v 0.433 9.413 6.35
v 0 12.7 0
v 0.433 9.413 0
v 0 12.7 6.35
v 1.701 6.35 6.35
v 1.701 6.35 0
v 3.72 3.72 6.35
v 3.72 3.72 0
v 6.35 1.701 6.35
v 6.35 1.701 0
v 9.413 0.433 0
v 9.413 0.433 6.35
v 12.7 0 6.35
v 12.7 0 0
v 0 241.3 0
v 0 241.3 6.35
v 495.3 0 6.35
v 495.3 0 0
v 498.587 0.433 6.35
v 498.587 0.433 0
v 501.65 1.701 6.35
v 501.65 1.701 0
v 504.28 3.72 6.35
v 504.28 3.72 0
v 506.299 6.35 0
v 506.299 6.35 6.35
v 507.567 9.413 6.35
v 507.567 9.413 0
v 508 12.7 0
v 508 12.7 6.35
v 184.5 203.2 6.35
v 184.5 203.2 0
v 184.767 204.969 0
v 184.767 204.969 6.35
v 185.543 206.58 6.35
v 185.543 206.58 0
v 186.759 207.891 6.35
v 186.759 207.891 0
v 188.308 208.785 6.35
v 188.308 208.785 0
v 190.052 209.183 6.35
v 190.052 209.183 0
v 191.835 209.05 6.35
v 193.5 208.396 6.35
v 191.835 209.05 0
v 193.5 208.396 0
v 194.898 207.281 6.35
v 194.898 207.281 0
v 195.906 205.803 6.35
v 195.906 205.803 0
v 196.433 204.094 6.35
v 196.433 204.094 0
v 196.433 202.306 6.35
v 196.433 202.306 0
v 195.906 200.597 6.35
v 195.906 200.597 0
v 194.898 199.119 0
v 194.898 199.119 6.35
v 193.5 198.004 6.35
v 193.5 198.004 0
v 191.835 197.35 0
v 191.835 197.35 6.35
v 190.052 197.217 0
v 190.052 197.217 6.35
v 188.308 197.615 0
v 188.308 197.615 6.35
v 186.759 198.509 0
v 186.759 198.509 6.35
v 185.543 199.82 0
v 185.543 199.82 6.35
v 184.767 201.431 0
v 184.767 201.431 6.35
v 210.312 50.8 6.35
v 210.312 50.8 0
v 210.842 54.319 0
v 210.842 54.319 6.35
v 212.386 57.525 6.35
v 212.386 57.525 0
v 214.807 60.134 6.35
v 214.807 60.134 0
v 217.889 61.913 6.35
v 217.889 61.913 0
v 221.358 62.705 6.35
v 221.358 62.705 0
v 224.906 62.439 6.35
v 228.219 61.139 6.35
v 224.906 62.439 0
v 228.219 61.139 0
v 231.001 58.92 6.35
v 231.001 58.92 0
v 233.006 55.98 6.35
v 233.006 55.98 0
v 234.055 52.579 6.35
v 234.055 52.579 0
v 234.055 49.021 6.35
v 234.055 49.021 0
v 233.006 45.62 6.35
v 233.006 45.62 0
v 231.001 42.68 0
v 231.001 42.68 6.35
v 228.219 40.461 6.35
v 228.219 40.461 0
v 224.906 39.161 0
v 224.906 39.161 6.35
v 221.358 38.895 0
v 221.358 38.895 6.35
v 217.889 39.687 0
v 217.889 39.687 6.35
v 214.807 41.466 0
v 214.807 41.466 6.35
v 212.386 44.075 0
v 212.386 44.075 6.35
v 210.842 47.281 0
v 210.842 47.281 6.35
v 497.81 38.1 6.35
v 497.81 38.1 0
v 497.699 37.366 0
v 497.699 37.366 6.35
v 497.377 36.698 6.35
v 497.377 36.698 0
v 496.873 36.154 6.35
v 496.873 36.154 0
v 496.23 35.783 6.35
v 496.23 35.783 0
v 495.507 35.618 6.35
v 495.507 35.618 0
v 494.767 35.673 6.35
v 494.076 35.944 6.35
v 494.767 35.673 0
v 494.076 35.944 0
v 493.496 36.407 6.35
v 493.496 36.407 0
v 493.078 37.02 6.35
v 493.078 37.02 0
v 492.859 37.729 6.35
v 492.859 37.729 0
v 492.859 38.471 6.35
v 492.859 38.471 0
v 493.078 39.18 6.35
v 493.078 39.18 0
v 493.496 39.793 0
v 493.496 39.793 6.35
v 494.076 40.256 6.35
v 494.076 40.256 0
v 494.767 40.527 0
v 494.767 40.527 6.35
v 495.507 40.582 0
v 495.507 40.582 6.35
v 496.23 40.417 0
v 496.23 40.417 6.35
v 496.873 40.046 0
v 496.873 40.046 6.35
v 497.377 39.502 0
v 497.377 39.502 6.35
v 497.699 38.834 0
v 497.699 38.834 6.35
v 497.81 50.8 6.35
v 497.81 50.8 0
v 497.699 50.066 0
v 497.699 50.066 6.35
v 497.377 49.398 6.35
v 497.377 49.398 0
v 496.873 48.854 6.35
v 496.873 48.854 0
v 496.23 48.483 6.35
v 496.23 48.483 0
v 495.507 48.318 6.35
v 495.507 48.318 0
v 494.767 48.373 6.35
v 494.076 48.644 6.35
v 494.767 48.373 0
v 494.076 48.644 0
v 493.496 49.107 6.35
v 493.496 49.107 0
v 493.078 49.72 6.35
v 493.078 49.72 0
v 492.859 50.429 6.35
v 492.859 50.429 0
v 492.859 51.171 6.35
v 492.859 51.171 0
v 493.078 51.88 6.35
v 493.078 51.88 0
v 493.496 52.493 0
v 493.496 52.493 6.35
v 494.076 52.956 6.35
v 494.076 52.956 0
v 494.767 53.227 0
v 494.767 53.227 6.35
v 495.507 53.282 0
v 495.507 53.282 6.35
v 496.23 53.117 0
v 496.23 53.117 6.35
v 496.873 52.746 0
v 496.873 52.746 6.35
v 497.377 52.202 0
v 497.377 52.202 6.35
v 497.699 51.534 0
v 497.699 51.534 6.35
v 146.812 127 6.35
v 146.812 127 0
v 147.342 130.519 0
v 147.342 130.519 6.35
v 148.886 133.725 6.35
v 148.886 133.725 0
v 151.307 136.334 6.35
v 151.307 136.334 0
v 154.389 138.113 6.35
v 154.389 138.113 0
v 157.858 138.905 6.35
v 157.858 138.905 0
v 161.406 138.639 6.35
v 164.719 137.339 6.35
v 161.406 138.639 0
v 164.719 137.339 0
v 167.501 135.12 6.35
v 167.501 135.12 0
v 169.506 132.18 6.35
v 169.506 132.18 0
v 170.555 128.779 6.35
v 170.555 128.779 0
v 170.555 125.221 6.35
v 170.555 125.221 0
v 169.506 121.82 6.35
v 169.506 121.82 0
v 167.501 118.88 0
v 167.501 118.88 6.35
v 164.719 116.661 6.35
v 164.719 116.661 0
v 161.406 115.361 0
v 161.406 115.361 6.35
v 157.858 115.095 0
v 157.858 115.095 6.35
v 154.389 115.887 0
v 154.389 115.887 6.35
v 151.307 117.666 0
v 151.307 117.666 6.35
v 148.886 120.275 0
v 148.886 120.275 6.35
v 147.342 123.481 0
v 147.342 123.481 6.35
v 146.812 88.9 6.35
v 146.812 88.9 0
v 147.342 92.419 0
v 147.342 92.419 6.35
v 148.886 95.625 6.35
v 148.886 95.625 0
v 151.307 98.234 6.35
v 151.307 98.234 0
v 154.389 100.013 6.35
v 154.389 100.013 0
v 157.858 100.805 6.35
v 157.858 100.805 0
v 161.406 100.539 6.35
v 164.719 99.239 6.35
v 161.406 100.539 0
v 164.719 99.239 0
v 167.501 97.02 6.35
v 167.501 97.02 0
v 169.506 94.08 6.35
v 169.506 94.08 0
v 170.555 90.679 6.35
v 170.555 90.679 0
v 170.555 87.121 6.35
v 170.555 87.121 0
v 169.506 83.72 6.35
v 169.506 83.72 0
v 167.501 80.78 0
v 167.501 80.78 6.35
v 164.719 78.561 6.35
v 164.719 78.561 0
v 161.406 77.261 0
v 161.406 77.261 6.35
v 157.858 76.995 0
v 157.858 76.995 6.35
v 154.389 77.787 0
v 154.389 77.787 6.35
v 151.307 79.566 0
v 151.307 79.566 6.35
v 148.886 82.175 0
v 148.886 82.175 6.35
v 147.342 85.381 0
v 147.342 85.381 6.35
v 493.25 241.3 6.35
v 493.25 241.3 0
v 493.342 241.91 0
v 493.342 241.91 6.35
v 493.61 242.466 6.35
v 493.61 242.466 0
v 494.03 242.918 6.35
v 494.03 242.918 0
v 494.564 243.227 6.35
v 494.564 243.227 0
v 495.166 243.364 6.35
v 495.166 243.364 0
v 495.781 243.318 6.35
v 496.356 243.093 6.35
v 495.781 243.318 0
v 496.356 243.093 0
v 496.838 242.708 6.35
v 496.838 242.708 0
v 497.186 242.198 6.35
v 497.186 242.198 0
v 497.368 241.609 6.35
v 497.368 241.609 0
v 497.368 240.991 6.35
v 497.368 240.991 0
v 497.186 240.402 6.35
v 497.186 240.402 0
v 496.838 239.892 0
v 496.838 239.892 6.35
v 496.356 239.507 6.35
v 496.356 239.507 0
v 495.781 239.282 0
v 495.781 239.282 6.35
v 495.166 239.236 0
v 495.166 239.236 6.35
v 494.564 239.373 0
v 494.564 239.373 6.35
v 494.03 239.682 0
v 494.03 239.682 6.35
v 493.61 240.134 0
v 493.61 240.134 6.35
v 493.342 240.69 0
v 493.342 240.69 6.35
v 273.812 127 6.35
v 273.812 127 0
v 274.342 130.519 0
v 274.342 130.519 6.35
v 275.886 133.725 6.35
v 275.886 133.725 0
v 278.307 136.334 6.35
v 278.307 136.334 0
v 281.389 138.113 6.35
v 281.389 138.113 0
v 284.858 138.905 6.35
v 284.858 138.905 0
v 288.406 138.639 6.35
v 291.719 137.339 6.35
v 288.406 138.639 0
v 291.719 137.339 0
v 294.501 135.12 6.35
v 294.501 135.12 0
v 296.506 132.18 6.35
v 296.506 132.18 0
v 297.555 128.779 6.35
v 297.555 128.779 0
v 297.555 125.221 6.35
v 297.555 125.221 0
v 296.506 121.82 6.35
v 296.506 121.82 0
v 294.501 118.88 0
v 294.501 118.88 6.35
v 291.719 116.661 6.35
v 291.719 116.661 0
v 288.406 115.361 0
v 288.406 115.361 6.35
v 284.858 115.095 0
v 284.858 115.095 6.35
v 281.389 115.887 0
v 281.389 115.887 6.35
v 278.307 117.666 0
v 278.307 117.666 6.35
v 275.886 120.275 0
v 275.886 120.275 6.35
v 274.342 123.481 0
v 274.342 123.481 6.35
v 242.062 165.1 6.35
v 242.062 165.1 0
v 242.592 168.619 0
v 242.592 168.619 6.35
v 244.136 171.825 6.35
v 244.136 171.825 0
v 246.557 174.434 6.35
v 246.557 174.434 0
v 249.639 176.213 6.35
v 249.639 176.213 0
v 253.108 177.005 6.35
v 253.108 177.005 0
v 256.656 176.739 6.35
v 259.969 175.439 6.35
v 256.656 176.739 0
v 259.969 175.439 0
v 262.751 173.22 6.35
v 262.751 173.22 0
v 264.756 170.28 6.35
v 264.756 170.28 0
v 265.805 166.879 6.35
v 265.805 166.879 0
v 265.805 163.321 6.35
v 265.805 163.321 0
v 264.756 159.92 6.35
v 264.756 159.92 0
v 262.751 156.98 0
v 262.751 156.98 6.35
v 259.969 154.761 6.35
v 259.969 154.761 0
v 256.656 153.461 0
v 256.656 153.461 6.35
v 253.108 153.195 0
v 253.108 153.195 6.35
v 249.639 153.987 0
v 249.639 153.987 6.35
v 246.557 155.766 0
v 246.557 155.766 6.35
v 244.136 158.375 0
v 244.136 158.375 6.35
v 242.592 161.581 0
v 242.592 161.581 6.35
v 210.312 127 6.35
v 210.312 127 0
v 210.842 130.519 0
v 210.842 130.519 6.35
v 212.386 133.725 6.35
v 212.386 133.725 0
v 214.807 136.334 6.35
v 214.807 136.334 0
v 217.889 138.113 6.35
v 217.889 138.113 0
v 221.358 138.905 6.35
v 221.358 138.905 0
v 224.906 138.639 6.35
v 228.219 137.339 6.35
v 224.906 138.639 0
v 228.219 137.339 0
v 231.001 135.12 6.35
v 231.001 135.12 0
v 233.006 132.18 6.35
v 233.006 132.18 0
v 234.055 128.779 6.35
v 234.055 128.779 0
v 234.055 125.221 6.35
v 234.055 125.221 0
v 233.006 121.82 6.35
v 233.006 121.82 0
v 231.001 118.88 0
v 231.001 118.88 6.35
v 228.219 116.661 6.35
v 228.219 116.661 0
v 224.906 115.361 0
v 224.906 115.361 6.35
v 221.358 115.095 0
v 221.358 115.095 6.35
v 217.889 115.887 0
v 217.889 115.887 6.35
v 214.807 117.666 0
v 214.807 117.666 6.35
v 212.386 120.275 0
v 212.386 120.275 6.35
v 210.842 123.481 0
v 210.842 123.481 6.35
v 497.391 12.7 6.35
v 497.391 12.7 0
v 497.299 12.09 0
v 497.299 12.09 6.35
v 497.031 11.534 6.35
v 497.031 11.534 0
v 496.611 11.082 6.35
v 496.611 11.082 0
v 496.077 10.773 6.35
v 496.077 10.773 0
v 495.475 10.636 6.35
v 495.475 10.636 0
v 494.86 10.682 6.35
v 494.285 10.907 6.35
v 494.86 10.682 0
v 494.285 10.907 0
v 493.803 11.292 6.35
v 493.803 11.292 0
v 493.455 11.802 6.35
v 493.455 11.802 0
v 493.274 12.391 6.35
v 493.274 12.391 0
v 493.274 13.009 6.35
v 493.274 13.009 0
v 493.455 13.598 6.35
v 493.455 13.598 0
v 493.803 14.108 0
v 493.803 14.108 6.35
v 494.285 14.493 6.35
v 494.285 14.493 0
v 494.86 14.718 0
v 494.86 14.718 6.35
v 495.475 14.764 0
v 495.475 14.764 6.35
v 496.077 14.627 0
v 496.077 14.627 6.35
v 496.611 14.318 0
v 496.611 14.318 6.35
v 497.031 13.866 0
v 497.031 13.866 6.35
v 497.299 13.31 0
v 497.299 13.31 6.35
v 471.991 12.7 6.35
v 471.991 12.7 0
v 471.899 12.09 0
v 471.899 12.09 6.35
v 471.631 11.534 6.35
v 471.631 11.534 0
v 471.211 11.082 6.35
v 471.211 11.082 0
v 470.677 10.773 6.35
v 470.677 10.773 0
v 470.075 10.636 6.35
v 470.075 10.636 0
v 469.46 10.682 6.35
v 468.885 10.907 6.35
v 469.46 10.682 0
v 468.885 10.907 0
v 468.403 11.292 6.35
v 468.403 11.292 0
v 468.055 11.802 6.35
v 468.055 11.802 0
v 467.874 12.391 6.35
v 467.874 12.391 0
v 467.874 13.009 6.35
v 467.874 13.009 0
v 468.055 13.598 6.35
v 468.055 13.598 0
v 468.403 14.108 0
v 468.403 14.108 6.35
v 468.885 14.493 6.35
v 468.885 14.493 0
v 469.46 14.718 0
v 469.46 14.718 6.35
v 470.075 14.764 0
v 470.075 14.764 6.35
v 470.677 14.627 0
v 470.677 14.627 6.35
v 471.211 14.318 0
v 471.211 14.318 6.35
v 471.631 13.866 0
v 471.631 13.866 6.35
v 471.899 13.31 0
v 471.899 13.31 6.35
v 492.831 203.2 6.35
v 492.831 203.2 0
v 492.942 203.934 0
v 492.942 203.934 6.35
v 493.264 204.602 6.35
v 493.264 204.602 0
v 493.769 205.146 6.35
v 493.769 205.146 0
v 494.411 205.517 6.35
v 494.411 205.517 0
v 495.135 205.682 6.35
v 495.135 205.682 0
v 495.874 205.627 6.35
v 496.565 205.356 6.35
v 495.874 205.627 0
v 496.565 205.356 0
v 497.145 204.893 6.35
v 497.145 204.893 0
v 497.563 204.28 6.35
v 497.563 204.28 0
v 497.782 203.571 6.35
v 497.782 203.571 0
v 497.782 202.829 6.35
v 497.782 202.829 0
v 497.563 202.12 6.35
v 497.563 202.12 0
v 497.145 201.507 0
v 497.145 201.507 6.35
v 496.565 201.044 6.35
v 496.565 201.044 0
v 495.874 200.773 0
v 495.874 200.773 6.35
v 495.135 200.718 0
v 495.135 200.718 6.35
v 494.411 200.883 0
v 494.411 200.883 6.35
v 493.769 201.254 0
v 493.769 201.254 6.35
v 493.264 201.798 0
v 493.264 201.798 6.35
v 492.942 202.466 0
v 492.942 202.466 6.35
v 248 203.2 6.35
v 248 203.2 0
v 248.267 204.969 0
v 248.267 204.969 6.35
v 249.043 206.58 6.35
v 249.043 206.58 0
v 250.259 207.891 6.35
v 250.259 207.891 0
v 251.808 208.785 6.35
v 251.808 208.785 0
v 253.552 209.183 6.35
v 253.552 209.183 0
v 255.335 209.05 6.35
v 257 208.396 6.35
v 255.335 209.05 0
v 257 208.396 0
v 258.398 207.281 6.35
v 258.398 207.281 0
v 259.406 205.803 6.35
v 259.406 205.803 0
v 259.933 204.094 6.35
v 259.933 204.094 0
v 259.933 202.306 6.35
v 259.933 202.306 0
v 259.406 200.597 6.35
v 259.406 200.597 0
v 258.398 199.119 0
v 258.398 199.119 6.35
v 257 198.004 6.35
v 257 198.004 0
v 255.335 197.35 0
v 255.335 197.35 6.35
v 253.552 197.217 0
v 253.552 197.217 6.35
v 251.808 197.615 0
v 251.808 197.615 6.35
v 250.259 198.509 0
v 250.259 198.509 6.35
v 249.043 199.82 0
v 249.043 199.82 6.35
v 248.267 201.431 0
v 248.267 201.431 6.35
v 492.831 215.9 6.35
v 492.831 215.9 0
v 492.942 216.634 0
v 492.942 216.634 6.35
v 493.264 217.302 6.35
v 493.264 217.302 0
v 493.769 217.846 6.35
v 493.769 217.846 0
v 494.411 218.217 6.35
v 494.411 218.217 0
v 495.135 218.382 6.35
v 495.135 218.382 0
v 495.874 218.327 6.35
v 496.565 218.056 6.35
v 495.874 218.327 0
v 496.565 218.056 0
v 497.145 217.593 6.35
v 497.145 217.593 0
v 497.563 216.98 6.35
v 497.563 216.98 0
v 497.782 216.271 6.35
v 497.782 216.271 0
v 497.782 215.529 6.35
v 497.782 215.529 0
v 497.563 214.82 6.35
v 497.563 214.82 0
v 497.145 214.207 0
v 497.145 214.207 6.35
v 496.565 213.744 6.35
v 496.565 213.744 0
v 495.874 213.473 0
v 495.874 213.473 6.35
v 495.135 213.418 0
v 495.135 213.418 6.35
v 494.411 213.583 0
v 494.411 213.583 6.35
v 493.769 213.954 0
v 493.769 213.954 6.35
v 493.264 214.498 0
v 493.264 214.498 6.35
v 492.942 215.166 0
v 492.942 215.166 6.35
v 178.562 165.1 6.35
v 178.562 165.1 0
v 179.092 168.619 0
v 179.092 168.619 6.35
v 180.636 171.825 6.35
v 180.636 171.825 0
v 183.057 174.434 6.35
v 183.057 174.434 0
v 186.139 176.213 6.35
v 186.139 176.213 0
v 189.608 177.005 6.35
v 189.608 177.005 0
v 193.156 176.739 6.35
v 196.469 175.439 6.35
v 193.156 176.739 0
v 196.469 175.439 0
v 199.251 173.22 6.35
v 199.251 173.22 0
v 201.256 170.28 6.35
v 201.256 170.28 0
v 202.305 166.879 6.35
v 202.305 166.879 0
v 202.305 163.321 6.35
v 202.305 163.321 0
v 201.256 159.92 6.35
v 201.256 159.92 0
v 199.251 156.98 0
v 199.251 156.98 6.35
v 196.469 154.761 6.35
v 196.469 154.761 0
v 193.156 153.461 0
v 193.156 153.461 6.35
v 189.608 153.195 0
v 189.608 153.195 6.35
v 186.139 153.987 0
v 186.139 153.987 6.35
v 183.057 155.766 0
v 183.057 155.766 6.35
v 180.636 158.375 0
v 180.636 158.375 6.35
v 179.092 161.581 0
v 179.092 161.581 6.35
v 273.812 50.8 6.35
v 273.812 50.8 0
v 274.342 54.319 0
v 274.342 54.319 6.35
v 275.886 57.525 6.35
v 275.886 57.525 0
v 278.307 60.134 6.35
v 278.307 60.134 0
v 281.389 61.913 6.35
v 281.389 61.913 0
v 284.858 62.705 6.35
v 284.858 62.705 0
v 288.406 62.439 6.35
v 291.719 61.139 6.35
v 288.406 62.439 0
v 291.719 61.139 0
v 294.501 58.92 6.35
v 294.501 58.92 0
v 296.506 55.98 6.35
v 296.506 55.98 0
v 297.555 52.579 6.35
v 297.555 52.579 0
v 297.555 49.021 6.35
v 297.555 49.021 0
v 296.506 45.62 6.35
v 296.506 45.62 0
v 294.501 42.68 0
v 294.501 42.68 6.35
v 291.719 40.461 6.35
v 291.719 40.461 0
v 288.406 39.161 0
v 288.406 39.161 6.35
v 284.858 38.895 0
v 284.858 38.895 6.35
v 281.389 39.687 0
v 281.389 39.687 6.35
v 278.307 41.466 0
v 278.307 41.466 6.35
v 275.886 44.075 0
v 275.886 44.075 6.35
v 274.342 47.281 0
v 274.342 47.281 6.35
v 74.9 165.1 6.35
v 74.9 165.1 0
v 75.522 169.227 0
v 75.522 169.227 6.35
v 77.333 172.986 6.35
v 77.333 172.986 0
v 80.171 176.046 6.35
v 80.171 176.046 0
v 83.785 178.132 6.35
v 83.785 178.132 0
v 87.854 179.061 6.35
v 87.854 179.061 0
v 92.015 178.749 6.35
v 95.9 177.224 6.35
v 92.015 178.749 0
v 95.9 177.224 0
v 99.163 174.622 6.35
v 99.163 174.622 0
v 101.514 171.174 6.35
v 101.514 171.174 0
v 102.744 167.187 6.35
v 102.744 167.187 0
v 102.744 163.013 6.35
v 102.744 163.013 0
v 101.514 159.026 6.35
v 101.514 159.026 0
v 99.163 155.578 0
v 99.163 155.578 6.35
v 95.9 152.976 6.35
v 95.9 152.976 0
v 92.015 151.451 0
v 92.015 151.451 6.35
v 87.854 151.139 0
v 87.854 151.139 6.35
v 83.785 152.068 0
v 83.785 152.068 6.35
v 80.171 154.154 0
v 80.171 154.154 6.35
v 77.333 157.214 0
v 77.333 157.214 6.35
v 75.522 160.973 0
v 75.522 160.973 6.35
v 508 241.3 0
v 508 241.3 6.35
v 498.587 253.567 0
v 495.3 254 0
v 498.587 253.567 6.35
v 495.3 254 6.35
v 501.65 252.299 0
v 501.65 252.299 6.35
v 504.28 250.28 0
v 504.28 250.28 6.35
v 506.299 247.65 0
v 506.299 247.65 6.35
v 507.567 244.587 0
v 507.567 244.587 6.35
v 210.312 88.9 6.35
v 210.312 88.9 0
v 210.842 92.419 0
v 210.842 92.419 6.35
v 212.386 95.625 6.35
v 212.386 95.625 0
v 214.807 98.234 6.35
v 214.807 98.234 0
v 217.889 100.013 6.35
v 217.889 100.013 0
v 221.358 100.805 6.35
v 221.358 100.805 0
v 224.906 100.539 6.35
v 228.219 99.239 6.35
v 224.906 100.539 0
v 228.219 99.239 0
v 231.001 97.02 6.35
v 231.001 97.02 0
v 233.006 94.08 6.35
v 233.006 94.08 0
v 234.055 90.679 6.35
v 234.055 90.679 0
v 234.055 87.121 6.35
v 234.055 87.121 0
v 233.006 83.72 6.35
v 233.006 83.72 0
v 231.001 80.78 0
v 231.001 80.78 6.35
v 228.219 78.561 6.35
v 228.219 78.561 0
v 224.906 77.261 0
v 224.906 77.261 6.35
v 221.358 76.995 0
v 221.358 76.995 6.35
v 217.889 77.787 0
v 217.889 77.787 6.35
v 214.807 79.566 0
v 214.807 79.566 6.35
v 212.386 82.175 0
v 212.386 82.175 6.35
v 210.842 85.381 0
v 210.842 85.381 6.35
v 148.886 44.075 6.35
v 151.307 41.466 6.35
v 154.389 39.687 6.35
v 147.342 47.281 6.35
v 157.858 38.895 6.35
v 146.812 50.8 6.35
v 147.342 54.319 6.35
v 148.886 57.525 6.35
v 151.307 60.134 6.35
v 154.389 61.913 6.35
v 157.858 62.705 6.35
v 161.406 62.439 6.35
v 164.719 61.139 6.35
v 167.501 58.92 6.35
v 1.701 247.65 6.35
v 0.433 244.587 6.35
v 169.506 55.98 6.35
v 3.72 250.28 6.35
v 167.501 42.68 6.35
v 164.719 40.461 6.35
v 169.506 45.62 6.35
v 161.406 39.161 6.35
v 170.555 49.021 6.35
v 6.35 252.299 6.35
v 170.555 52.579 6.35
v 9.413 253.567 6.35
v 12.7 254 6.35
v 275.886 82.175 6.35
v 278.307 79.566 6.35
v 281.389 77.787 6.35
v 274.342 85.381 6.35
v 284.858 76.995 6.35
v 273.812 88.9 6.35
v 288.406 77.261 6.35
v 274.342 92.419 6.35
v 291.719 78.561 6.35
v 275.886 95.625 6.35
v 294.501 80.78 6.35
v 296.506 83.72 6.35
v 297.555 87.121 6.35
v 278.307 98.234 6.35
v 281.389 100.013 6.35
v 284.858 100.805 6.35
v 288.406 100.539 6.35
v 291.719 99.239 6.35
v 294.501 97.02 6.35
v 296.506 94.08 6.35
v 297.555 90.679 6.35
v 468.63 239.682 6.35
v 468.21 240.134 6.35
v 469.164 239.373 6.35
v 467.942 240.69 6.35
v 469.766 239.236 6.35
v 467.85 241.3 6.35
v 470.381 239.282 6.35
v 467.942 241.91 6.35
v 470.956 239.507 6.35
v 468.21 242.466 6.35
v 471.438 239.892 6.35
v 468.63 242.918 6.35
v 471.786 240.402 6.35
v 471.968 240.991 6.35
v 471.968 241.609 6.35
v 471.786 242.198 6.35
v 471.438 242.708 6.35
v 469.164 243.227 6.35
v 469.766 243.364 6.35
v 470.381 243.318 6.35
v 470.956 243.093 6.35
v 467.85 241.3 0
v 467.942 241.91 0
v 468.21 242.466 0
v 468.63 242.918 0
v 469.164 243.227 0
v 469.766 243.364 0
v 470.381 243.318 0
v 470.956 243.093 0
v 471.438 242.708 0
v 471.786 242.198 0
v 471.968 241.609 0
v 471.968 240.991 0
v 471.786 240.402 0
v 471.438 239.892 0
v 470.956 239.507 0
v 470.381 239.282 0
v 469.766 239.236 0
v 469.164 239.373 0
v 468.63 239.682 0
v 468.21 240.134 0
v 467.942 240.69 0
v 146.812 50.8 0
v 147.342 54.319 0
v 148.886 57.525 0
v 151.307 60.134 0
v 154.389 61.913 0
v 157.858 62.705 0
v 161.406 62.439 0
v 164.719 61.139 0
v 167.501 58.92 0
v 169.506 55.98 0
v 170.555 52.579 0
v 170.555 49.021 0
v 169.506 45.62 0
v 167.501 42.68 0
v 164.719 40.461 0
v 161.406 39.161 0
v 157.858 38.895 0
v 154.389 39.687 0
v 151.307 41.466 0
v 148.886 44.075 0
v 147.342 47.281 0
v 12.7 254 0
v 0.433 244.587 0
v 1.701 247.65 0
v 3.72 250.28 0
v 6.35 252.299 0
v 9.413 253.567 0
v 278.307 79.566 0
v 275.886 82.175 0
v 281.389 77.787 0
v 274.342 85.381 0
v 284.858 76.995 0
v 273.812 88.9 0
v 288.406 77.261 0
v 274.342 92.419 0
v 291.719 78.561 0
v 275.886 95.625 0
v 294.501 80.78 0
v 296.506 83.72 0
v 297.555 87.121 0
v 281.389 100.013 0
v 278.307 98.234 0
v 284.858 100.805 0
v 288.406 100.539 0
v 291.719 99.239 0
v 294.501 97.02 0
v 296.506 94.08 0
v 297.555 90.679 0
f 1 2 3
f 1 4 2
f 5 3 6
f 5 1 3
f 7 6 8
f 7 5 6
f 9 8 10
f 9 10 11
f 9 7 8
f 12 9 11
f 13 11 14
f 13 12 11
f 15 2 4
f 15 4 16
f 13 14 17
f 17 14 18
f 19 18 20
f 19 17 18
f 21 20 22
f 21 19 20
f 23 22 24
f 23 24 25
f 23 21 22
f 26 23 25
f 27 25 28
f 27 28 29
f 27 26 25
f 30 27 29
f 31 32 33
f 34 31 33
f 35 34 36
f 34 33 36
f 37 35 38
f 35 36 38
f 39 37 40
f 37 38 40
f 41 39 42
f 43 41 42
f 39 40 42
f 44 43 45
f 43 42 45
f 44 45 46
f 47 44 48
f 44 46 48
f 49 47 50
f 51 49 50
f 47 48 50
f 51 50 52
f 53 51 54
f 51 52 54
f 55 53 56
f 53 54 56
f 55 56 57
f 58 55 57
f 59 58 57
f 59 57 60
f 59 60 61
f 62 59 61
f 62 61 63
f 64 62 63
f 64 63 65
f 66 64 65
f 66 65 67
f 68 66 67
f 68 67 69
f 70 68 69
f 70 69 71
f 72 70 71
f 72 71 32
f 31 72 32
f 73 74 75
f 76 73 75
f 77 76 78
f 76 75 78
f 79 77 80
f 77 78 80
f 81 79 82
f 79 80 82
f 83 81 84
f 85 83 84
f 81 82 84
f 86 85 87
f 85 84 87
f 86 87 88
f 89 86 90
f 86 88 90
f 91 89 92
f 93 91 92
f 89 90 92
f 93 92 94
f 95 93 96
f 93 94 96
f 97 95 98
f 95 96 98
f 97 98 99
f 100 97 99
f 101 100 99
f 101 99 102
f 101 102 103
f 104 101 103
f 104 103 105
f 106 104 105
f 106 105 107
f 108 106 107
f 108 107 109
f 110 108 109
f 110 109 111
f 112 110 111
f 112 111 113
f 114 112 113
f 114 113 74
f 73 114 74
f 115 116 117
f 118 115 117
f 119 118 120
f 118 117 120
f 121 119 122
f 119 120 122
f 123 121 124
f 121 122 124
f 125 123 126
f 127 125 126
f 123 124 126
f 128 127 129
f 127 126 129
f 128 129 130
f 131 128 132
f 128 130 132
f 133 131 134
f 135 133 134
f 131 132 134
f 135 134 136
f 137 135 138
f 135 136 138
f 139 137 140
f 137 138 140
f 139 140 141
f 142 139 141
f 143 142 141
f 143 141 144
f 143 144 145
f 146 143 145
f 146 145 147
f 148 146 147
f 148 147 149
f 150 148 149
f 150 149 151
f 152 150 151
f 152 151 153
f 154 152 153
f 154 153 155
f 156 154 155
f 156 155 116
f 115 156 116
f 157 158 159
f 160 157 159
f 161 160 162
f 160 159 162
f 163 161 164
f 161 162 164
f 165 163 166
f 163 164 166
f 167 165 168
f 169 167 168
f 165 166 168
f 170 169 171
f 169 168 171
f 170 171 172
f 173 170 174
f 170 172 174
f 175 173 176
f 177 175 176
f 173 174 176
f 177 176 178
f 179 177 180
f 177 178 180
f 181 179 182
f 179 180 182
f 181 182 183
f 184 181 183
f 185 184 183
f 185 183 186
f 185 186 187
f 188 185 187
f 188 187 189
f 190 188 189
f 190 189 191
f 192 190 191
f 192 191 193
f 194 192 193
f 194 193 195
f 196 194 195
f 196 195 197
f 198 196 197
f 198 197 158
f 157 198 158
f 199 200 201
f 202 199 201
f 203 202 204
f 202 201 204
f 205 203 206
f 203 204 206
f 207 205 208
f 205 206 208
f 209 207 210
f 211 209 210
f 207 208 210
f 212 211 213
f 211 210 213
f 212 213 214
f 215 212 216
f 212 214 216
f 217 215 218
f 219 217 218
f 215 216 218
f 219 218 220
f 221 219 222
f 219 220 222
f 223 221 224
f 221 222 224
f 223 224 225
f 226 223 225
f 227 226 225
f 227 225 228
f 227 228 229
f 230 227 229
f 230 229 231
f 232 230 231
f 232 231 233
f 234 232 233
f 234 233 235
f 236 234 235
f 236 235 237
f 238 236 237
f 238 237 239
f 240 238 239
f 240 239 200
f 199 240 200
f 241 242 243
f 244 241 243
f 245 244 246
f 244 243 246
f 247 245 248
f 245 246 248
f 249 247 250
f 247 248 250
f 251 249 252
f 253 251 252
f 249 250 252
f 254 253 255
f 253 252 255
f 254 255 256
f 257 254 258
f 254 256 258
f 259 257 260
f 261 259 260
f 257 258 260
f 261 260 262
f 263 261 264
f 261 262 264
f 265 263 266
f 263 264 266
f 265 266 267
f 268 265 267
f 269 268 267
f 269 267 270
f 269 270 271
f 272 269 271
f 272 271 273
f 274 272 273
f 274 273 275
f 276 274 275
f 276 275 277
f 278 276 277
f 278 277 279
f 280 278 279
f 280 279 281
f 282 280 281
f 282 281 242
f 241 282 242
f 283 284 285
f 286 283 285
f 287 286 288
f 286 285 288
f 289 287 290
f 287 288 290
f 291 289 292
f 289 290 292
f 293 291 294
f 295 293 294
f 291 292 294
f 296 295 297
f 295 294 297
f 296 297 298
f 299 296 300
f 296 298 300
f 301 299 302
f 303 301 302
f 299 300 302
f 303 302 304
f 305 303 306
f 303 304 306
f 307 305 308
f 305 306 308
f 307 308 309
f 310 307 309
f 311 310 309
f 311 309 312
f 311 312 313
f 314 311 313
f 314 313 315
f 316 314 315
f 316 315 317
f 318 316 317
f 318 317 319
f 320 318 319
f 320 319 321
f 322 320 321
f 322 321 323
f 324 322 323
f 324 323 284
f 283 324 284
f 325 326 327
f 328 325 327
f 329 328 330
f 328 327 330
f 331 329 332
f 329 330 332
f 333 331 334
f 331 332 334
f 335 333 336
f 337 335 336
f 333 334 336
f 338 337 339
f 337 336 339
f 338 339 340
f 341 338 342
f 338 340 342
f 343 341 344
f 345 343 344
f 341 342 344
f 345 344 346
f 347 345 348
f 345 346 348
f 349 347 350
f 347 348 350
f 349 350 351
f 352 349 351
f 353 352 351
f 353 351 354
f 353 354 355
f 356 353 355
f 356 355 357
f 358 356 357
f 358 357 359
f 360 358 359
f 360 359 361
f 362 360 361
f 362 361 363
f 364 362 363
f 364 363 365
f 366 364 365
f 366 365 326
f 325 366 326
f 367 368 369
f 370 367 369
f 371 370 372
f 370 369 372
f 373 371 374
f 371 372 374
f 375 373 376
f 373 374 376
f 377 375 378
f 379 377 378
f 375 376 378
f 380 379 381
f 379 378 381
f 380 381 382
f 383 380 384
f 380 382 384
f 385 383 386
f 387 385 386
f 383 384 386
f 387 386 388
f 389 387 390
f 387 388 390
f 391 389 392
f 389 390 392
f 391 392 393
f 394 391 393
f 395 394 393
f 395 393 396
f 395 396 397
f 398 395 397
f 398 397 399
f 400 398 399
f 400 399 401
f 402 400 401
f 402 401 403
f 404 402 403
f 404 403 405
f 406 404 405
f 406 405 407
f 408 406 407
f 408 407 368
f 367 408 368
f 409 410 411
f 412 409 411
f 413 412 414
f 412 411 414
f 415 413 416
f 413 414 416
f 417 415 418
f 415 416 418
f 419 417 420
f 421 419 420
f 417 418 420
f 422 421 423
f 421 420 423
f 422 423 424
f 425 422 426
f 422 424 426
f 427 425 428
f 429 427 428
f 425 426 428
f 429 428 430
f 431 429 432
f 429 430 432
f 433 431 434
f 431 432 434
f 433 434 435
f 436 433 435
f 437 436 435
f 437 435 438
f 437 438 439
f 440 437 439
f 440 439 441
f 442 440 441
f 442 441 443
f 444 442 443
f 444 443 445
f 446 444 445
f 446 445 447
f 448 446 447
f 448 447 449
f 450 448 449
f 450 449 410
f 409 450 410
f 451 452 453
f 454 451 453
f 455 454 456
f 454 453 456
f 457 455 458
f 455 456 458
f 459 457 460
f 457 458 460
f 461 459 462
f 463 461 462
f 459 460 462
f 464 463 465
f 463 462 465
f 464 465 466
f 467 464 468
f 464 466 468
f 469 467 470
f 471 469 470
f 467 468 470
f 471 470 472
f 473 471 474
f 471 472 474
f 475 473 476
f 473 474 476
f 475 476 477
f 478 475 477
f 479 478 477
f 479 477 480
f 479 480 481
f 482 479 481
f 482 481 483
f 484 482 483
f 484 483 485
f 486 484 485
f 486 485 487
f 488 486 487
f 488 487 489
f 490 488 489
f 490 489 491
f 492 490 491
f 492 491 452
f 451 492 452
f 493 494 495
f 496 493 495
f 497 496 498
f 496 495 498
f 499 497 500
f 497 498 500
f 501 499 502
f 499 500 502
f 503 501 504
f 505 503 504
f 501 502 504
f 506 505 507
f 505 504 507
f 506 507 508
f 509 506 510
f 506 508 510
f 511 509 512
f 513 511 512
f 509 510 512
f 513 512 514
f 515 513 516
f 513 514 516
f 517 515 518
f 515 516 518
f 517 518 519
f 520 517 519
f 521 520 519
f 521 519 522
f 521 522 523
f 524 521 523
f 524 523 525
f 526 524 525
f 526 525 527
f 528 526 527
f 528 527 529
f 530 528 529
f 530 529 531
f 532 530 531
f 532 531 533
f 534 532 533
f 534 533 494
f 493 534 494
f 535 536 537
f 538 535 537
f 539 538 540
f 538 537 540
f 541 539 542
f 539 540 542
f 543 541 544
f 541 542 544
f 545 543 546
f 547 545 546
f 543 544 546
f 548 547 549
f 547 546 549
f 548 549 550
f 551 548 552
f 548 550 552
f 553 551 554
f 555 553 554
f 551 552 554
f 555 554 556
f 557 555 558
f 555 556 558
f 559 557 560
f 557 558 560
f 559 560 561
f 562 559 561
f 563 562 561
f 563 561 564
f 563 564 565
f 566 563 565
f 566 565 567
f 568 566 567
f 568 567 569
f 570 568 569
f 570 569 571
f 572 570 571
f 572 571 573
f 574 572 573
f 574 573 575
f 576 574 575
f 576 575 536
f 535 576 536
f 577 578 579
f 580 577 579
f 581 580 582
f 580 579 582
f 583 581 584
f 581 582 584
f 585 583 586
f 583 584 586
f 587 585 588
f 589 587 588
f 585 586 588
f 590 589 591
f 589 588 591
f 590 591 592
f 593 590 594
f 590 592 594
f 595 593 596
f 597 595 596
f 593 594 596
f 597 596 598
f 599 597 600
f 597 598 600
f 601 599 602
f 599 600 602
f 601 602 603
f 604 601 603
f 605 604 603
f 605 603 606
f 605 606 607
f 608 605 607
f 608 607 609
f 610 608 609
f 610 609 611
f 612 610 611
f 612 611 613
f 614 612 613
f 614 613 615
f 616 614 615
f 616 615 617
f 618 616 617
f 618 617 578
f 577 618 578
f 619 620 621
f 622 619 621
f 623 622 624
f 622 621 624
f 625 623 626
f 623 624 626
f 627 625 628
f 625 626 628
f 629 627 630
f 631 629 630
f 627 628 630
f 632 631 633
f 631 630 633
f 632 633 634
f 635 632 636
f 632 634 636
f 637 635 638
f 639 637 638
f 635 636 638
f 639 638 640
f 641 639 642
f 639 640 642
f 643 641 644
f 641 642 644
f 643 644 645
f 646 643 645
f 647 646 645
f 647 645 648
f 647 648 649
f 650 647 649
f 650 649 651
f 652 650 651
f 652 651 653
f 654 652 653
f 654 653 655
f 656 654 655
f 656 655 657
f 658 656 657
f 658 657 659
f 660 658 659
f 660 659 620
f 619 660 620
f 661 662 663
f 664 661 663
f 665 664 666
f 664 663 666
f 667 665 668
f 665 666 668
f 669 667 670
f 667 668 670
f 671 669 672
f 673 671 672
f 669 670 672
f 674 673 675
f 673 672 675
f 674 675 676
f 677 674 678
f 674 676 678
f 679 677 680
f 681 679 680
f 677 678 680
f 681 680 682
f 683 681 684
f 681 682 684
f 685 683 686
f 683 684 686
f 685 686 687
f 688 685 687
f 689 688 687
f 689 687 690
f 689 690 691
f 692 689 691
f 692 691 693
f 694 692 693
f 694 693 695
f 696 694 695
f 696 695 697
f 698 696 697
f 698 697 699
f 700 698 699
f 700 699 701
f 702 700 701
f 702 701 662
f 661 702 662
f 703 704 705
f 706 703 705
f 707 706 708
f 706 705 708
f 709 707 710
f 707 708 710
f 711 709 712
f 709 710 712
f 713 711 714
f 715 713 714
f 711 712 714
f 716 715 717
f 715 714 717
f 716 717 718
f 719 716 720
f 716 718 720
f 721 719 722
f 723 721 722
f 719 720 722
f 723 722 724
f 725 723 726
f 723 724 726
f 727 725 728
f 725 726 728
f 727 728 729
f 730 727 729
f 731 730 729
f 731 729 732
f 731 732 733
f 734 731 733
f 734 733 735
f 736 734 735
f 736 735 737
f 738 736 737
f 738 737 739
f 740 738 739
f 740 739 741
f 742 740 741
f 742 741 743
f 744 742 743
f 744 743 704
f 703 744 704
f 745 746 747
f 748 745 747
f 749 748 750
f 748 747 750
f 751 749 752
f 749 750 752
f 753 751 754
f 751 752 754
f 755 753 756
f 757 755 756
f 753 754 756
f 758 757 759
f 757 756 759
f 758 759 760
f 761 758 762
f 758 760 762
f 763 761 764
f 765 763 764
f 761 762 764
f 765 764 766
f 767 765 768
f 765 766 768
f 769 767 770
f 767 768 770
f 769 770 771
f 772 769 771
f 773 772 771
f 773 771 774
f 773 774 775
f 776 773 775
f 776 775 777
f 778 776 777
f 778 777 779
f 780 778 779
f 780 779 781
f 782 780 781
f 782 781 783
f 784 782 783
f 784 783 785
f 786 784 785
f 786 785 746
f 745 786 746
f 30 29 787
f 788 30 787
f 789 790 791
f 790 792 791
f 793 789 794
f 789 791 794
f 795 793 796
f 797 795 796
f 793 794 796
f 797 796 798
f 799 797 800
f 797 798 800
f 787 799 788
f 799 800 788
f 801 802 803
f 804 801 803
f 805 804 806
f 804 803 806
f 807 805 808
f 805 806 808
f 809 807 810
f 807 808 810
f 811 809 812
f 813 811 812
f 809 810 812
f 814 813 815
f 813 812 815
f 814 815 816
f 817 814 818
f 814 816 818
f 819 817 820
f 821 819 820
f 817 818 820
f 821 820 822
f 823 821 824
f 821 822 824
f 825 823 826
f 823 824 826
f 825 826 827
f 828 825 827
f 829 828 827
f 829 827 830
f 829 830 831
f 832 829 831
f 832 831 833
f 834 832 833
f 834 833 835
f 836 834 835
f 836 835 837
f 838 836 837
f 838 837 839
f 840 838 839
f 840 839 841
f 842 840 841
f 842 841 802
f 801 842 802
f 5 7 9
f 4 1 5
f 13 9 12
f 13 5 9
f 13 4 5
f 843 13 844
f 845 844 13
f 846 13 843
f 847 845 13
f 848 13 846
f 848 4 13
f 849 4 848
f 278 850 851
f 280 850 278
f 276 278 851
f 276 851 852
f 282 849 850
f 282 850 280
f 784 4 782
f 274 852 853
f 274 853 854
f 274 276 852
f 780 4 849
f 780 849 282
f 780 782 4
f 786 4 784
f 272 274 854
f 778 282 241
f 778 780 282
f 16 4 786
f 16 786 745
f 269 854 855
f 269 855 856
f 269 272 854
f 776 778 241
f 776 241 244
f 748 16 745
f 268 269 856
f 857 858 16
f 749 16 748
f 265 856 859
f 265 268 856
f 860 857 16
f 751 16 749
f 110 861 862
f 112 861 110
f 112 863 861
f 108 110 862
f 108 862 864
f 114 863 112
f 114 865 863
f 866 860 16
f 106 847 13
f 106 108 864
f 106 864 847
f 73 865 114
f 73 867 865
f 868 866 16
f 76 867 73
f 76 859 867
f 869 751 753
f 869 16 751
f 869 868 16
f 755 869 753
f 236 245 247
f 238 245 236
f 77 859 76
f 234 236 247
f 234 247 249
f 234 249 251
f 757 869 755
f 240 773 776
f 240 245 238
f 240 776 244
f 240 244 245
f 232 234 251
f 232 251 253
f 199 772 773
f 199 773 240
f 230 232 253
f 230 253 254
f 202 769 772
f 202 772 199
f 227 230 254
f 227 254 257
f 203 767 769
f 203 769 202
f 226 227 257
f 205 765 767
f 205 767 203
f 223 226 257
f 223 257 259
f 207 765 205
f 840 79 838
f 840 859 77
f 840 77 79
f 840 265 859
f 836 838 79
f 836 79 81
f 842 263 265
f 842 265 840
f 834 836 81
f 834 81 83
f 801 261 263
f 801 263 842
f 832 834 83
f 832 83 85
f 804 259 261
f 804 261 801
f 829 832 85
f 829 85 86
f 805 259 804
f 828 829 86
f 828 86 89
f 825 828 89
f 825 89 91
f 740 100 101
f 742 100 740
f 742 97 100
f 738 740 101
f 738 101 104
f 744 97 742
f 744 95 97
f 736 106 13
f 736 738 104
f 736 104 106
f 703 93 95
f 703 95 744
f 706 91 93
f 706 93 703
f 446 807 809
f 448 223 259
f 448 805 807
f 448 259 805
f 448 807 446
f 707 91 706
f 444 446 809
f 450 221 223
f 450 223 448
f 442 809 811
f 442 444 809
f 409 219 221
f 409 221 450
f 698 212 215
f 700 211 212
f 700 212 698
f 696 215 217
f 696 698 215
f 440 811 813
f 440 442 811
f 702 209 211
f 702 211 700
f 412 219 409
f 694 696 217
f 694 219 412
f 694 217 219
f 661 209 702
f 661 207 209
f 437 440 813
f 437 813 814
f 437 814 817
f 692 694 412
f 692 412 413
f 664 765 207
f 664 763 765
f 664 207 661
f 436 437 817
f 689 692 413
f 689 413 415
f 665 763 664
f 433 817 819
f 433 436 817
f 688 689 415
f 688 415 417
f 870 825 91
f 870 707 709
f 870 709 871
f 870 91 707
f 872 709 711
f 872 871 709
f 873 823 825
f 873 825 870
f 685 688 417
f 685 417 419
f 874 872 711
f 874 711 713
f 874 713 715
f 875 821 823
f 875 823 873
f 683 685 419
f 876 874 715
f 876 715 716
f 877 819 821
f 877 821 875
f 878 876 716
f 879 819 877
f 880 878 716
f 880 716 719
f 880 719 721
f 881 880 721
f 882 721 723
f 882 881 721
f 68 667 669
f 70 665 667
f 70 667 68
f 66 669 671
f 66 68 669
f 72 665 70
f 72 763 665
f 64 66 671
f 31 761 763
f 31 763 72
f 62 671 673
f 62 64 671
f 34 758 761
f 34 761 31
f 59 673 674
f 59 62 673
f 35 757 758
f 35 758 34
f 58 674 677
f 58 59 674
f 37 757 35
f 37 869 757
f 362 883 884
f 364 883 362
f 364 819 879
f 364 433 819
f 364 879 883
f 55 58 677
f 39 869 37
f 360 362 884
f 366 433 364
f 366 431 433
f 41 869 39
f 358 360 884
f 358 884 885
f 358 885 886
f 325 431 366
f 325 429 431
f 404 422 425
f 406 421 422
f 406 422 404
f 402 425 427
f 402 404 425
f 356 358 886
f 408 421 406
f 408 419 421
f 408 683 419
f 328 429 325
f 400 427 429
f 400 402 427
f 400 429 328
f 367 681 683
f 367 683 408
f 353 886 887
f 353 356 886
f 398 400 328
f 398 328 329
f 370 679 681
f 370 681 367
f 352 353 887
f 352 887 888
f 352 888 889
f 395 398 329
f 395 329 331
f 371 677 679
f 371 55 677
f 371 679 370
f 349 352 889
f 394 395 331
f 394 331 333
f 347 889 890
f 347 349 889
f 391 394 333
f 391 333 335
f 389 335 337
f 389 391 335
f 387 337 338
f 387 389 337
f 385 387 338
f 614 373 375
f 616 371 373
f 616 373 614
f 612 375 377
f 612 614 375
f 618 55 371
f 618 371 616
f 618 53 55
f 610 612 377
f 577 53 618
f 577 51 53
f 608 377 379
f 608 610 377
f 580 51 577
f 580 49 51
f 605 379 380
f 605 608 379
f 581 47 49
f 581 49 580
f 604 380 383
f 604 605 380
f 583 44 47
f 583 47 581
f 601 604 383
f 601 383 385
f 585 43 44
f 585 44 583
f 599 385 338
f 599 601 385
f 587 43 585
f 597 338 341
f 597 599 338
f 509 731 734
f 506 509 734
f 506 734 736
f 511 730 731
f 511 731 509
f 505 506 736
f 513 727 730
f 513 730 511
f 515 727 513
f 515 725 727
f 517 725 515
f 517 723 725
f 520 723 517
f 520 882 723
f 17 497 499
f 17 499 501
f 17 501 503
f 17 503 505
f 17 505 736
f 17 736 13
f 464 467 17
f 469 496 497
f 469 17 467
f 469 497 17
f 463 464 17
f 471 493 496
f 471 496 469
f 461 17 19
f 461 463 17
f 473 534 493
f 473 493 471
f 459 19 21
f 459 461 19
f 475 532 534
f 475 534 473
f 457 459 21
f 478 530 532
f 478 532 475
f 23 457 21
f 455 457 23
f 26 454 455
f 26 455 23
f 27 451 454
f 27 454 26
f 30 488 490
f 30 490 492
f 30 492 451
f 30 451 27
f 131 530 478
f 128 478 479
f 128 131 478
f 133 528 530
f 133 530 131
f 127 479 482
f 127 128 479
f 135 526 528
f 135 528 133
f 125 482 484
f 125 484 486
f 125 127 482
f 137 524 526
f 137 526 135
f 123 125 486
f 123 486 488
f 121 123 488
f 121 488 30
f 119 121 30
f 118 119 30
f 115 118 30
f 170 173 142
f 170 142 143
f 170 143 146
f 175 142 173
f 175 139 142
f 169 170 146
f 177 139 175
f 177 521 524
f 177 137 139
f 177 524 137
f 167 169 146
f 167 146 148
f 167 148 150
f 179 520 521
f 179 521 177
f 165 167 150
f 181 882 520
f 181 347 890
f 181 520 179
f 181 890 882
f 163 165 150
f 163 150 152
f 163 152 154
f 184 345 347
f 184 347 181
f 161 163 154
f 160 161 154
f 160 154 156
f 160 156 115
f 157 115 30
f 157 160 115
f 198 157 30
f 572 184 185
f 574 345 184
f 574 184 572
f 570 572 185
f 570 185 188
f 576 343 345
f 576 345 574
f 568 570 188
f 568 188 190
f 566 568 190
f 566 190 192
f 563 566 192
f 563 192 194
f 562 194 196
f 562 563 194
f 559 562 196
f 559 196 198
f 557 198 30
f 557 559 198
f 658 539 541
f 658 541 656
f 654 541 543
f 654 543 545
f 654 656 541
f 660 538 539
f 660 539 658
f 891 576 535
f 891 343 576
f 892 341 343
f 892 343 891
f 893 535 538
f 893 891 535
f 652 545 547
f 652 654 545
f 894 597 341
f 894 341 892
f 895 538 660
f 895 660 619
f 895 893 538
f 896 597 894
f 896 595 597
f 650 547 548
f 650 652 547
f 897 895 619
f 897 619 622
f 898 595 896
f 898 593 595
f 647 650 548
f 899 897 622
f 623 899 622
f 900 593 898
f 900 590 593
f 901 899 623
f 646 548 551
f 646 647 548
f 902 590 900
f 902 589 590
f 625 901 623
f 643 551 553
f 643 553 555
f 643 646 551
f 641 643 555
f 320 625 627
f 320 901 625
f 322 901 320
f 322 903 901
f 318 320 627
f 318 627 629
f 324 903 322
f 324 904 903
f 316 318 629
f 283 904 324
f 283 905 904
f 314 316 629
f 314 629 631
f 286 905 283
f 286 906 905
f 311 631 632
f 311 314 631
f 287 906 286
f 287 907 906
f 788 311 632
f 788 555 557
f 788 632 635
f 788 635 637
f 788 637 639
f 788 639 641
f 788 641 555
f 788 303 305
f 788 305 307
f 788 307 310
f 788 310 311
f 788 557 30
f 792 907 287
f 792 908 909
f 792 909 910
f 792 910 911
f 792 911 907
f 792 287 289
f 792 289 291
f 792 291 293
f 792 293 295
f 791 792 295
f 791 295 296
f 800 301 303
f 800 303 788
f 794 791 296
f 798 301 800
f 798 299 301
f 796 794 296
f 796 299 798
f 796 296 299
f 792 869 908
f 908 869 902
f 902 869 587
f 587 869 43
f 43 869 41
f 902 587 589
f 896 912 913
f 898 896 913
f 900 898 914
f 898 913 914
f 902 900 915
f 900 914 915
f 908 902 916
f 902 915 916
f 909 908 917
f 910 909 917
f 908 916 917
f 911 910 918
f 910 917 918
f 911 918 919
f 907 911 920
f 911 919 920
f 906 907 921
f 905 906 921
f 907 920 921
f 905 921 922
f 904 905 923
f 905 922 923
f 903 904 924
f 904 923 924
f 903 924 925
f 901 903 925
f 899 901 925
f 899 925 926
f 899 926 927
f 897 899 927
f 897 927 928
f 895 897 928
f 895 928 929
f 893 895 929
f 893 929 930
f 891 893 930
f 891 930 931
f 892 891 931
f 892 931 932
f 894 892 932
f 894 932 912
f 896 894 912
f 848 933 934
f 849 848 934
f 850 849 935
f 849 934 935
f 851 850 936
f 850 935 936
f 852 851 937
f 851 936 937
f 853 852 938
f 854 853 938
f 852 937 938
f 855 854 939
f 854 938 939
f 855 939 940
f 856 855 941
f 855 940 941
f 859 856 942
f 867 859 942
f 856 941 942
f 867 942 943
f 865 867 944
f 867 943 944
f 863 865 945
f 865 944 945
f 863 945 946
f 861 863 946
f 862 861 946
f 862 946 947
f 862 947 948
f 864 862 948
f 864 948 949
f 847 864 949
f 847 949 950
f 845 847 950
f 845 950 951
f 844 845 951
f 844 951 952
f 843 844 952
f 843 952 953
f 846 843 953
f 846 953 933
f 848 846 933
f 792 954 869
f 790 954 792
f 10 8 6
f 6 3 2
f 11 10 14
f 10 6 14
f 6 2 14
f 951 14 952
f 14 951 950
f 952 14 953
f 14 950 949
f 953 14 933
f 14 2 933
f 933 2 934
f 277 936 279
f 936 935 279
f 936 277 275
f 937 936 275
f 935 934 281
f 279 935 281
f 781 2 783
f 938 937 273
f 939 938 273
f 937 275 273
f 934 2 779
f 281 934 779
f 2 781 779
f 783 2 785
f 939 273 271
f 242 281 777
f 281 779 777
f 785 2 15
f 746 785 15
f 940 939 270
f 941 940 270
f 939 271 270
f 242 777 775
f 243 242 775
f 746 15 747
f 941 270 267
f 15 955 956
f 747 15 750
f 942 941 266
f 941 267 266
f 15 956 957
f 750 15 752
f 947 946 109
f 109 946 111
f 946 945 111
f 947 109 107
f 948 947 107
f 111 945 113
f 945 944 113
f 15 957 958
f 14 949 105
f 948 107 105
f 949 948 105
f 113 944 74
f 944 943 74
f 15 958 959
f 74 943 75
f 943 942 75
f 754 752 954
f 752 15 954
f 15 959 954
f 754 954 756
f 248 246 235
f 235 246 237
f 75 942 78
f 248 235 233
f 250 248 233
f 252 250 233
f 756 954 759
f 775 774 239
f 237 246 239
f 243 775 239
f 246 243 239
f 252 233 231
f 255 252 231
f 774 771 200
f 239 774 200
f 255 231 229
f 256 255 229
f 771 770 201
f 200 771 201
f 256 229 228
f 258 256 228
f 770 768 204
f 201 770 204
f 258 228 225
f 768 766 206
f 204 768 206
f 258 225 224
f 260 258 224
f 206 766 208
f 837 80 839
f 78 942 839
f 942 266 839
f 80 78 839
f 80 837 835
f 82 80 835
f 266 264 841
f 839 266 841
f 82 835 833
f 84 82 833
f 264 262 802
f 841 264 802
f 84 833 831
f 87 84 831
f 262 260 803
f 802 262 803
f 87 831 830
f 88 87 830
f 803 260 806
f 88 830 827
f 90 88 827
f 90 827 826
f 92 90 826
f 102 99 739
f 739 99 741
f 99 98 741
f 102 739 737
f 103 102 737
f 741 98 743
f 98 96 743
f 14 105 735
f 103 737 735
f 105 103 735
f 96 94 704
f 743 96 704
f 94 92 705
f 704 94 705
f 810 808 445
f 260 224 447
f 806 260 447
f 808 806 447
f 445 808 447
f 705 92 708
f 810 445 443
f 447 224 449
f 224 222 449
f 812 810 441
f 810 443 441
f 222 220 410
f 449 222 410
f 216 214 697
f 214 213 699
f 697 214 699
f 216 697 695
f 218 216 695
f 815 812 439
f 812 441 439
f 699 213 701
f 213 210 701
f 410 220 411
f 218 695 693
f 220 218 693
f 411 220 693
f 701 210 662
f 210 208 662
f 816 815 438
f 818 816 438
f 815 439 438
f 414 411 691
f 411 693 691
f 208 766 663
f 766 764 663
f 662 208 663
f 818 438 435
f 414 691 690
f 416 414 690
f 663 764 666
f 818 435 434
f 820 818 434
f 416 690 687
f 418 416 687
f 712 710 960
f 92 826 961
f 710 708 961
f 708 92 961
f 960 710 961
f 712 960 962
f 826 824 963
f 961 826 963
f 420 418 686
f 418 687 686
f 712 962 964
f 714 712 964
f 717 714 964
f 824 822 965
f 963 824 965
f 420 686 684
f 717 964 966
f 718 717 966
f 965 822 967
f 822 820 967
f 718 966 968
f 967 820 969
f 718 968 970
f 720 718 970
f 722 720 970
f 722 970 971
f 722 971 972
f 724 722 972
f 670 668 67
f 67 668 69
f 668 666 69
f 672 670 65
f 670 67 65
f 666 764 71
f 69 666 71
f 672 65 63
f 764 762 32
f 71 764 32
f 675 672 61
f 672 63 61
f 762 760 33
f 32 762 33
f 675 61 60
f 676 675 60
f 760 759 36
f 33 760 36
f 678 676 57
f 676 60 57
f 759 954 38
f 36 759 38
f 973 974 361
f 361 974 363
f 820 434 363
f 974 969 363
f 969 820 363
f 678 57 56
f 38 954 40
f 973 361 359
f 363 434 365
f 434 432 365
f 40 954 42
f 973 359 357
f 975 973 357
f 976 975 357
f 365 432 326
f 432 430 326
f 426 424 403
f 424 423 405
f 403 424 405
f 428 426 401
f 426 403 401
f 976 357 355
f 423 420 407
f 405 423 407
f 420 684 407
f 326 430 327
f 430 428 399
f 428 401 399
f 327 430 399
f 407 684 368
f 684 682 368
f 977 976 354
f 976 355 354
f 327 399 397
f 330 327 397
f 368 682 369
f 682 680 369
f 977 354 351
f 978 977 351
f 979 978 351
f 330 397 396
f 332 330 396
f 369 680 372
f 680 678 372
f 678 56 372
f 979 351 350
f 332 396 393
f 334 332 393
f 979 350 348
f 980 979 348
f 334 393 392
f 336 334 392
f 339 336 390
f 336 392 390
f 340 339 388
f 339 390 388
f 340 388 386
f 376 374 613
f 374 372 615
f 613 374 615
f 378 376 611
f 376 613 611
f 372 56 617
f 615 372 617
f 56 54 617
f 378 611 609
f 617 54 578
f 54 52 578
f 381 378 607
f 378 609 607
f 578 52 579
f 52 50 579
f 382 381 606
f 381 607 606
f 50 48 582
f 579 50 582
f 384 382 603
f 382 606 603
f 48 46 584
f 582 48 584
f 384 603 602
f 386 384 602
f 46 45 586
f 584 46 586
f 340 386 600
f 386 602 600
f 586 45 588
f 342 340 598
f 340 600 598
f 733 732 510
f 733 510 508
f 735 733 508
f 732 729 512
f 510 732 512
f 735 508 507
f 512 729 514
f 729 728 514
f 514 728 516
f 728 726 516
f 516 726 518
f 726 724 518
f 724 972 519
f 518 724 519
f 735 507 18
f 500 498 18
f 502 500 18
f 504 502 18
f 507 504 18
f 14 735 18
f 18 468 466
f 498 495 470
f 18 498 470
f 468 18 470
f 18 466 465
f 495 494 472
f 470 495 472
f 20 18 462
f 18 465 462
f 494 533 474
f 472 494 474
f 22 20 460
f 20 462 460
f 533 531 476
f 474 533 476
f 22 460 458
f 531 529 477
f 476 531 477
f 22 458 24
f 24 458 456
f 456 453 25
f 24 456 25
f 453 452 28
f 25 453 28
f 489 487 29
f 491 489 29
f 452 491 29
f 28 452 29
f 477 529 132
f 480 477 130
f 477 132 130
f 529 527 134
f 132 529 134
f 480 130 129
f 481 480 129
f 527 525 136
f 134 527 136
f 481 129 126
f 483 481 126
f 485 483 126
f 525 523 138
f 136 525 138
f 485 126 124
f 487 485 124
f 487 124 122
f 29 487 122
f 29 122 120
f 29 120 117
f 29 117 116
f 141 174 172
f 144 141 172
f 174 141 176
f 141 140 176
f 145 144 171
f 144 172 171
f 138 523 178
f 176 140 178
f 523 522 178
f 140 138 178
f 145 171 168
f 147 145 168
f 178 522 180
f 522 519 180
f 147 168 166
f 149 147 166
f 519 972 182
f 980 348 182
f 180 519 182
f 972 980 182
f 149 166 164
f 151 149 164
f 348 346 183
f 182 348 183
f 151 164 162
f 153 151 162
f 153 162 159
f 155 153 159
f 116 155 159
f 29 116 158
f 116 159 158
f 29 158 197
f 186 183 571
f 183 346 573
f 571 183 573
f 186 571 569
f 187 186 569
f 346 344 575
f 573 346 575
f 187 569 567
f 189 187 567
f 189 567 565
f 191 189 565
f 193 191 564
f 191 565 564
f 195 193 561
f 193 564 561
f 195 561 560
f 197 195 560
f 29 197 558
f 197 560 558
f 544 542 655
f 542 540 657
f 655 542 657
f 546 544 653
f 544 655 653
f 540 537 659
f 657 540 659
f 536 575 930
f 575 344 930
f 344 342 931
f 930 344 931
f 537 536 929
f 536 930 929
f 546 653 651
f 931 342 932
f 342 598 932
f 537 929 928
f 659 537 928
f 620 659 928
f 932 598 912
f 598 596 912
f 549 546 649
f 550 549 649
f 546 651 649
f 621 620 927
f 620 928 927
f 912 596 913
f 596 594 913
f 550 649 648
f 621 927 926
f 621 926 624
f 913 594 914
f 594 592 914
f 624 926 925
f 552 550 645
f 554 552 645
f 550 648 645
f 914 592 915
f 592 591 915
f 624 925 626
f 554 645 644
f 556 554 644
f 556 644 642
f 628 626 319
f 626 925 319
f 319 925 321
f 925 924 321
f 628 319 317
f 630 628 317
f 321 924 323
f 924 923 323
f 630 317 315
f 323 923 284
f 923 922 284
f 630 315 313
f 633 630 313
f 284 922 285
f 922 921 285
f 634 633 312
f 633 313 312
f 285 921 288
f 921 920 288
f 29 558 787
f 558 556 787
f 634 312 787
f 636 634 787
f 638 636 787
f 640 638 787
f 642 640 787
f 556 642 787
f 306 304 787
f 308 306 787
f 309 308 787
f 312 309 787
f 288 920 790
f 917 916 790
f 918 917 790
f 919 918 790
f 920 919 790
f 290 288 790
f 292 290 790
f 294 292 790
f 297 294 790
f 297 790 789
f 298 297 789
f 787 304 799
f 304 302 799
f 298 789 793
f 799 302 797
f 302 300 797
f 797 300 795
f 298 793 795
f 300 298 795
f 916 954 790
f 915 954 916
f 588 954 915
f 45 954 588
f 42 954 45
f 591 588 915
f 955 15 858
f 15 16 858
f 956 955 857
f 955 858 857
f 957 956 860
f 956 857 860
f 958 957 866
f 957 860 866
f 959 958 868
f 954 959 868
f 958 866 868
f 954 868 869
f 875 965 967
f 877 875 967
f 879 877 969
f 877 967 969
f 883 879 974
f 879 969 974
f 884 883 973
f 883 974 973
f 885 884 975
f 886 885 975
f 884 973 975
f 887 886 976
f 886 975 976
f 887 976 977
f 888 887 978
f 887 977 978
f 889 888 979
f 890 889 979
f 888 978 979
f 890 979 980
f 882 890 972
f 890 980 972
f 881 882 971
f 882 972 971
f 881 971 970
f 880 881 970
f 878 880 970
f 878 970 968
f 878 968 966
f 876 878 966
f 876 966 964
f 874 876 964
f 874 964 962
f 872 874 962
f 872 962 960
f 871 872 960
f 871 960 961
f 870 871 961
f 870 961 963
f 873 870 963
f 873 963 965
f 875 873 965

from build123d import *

# Parameters (mm, degrees)
SKETCH1_W           = 508
SKETCH1_H           = 254
BOSS_EXTRUDE1_DEPTH = 6.35
SKETCH3_R           = 11.938
SKETCH3_R_2         = 6
SKETCH3_R_3         = 14
CUT_EXTRUDE2_DEPTH  = 568.996762755
FILLET1_R           = 12.7
SKETCH4_R           = 2.0701
SKETCH4_R_2         = 2.4892
CUT_EXTRUDE3_DEPTH  = 568.996762755


with BuildPart() as part:
    # Sketch1 → Boss-Extrude1 (new body)
    with BuildSketch(Plane.XY):
        with Locations((254, 127)):
            Rectangle(SKETCH1_W, SKETCH1_H)
    extrude(amount=BOSS_EXTRUDE1_DEPTH)

    # Sketch3 → Cut-Extrude2 (cut, through all)
    with BuildSketch(Plane(origin=(0, 0, 0), x_dir=(-1, 0, 0), z_dir=(0, 0, -1))):
        with Locations((-158.75, 88.9)):
            Circle(SKETCH3_R)
        with Locations((-222.25, 88.9)):
            Circle(SKETCH3_R)
        with Locations((-158.75, 50.8)):
            Circle(SKETCH3_R)
        with Locations((-222.25, 50.8)):
            Circle(SKETCH3_R)
        with Locations((-222.25, 127)):
            Circle(SKETCH3_R)
        with Locations((-285.75, 127)):
            Circle(SKETCH3_R)
        with Locations((-285.75, 88.9)):
            Circle(SKETCH3_R)
        with Locations((-285.75, 50.8)):
            Circle(SKETCH3_R)
        with Locations((-254, 203.2)):
            Circle(SKETCH3_R_2)
        with Locations((-190.5, 203.2)):
            Circle(SKETCH3_R_2)
        with Locations((-158.75, 127)):
            Circle(SKETCH3_R)
        with Locations((-190.5, 165.1)):
            Circle(SKETCH3_R)
        with Locations((-254, 165.1)):
            Circle(SKETCH3_R)
        with Locations((-88.9, 165.1)):
            Circle(SKETCH3_R_3)
    extrude(amount=-CUT_EXTRUDE2_DEPTH, mode=Mode.SUBTRACT)

    # Fillet1
    fillet1_edges = [part.edges().sort_by_distance(p)[0] for p in [
        (508, 0, 3.175),
        (0, 0, 3.175),
        (0, 254, 3.175),
        (508, 254, 3.175),
    ]]
    fillet(fillet1_edges, radius=FILLET1_R)

    # Sketch4 → Cut-Extrude3 (cut, through all)
    with BuildSketch(Plane(origin=(0, 0, 0), x_dir=(-1, 0, 0), z_dir=(0, 0, -1))):
        with Locations((-495.320545376, 241.3)):
            Circle(SKETCH4_R)
        with Locations((-469.920545376, 241.3)):
            Circle(SKETCH4_R)
        with Locations((-495.320545376, 215.9)):
            Circle(SKETCH4_R_2)
        with Locations((-495.320545376, 203.2)):
            Circle(SKETCH4_R_2)
        with Locations((-469.920545376, 12.7)):
            Circle(SKETCH4_R)
        with Locations((-495.320545376, 50.8)):
            Circle(SKETCH4_R_2)
        with Locations((-495.320545376, 38.1)):
            Circle(SKETCH4_R_2)
        with Locations((-495.320545376, 12.7)):
            Circle(SKETCH4_R)
    extrude(amount=-CUT_EXTRUDE3_DEPTH, mode=Mode.SUBTRACT)


solid = part.part
